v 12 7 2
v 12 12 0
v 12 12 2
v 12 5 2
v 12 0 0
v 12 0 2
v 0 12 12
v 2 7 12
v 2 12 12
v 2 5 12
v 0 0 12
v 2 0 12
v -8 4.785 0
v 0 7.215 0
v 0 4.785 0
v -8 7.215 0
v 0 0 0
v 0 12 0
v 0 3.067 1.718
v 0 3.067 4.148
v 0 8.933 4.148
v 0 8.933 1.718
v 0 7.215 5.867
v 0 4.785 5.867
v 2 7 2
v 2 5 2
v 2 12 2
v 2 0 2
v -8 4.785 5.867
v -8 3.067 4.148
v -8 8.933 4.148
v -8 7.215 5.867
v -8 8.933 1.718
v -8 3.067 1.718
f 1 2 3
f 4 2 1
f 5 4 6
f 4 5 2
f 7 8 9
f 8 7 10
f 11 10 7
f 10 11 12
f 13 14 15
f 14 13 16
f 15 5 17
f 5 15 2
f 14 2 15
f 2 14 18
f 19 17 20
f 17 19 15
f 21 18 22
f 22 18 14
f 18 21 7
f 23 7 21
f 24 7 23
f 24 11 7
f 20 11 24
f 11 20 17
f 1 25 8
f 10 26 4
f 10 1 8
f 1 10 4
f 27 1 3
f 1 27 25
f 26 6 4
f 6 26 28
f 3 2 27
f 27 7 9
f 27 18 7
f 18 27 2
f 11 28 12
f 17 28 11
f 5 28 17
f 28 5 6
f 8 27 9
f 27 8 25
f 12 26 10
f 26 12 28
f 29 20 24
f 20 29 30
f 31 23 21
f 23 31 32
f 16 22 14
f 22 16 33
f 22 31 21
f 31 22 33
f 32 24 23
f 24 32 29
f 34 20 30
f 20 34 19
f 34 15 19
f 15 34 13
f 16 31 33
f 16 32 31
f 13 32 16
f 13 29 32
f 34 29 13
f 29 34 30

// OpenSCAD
//9mm x 11mm top
//5mm hole in cabinet

length=12;
width=12;
thickness=2;
hole_size=6.35;
hole_depth=8;
peg_sides = 8;

// L-shaped bracket
cube(size = [length, width, thickness], center = false);
translate([0, 0, 0])
	cube(size = [thickness, width, length], center = false);

// 45-degree triangle brace
difference(){
	translate([0, (width - thickness) / 2, 0])
		cube(size = [length, thickness, length], center = false);
	
	rotate([0, 45, 0])
		translate([-length, (width - thickness) / 2 - 1, sqrt(2) * (length + thickness) / 2])
			cube(size = [length * 2, thickness * 2, length * 2], center = false);
}

// Peg
peg_z = (hole_size / 2) * cos(360 / (peg_sides * 2));	// Cylinder's flat side: sit on z==0
translate([-hole_depth, 1 + (width-thickness) / 2, peg_z])
	rotate([0, 90, 0])
		rotate([0, 0, 360 / (peg_sides * 2)])	// Rotate so cylinder's flat side is on the bottom
			cylinder(r = hole_size/2, h = hole_depth, center = false, $fn = peg_sides);
